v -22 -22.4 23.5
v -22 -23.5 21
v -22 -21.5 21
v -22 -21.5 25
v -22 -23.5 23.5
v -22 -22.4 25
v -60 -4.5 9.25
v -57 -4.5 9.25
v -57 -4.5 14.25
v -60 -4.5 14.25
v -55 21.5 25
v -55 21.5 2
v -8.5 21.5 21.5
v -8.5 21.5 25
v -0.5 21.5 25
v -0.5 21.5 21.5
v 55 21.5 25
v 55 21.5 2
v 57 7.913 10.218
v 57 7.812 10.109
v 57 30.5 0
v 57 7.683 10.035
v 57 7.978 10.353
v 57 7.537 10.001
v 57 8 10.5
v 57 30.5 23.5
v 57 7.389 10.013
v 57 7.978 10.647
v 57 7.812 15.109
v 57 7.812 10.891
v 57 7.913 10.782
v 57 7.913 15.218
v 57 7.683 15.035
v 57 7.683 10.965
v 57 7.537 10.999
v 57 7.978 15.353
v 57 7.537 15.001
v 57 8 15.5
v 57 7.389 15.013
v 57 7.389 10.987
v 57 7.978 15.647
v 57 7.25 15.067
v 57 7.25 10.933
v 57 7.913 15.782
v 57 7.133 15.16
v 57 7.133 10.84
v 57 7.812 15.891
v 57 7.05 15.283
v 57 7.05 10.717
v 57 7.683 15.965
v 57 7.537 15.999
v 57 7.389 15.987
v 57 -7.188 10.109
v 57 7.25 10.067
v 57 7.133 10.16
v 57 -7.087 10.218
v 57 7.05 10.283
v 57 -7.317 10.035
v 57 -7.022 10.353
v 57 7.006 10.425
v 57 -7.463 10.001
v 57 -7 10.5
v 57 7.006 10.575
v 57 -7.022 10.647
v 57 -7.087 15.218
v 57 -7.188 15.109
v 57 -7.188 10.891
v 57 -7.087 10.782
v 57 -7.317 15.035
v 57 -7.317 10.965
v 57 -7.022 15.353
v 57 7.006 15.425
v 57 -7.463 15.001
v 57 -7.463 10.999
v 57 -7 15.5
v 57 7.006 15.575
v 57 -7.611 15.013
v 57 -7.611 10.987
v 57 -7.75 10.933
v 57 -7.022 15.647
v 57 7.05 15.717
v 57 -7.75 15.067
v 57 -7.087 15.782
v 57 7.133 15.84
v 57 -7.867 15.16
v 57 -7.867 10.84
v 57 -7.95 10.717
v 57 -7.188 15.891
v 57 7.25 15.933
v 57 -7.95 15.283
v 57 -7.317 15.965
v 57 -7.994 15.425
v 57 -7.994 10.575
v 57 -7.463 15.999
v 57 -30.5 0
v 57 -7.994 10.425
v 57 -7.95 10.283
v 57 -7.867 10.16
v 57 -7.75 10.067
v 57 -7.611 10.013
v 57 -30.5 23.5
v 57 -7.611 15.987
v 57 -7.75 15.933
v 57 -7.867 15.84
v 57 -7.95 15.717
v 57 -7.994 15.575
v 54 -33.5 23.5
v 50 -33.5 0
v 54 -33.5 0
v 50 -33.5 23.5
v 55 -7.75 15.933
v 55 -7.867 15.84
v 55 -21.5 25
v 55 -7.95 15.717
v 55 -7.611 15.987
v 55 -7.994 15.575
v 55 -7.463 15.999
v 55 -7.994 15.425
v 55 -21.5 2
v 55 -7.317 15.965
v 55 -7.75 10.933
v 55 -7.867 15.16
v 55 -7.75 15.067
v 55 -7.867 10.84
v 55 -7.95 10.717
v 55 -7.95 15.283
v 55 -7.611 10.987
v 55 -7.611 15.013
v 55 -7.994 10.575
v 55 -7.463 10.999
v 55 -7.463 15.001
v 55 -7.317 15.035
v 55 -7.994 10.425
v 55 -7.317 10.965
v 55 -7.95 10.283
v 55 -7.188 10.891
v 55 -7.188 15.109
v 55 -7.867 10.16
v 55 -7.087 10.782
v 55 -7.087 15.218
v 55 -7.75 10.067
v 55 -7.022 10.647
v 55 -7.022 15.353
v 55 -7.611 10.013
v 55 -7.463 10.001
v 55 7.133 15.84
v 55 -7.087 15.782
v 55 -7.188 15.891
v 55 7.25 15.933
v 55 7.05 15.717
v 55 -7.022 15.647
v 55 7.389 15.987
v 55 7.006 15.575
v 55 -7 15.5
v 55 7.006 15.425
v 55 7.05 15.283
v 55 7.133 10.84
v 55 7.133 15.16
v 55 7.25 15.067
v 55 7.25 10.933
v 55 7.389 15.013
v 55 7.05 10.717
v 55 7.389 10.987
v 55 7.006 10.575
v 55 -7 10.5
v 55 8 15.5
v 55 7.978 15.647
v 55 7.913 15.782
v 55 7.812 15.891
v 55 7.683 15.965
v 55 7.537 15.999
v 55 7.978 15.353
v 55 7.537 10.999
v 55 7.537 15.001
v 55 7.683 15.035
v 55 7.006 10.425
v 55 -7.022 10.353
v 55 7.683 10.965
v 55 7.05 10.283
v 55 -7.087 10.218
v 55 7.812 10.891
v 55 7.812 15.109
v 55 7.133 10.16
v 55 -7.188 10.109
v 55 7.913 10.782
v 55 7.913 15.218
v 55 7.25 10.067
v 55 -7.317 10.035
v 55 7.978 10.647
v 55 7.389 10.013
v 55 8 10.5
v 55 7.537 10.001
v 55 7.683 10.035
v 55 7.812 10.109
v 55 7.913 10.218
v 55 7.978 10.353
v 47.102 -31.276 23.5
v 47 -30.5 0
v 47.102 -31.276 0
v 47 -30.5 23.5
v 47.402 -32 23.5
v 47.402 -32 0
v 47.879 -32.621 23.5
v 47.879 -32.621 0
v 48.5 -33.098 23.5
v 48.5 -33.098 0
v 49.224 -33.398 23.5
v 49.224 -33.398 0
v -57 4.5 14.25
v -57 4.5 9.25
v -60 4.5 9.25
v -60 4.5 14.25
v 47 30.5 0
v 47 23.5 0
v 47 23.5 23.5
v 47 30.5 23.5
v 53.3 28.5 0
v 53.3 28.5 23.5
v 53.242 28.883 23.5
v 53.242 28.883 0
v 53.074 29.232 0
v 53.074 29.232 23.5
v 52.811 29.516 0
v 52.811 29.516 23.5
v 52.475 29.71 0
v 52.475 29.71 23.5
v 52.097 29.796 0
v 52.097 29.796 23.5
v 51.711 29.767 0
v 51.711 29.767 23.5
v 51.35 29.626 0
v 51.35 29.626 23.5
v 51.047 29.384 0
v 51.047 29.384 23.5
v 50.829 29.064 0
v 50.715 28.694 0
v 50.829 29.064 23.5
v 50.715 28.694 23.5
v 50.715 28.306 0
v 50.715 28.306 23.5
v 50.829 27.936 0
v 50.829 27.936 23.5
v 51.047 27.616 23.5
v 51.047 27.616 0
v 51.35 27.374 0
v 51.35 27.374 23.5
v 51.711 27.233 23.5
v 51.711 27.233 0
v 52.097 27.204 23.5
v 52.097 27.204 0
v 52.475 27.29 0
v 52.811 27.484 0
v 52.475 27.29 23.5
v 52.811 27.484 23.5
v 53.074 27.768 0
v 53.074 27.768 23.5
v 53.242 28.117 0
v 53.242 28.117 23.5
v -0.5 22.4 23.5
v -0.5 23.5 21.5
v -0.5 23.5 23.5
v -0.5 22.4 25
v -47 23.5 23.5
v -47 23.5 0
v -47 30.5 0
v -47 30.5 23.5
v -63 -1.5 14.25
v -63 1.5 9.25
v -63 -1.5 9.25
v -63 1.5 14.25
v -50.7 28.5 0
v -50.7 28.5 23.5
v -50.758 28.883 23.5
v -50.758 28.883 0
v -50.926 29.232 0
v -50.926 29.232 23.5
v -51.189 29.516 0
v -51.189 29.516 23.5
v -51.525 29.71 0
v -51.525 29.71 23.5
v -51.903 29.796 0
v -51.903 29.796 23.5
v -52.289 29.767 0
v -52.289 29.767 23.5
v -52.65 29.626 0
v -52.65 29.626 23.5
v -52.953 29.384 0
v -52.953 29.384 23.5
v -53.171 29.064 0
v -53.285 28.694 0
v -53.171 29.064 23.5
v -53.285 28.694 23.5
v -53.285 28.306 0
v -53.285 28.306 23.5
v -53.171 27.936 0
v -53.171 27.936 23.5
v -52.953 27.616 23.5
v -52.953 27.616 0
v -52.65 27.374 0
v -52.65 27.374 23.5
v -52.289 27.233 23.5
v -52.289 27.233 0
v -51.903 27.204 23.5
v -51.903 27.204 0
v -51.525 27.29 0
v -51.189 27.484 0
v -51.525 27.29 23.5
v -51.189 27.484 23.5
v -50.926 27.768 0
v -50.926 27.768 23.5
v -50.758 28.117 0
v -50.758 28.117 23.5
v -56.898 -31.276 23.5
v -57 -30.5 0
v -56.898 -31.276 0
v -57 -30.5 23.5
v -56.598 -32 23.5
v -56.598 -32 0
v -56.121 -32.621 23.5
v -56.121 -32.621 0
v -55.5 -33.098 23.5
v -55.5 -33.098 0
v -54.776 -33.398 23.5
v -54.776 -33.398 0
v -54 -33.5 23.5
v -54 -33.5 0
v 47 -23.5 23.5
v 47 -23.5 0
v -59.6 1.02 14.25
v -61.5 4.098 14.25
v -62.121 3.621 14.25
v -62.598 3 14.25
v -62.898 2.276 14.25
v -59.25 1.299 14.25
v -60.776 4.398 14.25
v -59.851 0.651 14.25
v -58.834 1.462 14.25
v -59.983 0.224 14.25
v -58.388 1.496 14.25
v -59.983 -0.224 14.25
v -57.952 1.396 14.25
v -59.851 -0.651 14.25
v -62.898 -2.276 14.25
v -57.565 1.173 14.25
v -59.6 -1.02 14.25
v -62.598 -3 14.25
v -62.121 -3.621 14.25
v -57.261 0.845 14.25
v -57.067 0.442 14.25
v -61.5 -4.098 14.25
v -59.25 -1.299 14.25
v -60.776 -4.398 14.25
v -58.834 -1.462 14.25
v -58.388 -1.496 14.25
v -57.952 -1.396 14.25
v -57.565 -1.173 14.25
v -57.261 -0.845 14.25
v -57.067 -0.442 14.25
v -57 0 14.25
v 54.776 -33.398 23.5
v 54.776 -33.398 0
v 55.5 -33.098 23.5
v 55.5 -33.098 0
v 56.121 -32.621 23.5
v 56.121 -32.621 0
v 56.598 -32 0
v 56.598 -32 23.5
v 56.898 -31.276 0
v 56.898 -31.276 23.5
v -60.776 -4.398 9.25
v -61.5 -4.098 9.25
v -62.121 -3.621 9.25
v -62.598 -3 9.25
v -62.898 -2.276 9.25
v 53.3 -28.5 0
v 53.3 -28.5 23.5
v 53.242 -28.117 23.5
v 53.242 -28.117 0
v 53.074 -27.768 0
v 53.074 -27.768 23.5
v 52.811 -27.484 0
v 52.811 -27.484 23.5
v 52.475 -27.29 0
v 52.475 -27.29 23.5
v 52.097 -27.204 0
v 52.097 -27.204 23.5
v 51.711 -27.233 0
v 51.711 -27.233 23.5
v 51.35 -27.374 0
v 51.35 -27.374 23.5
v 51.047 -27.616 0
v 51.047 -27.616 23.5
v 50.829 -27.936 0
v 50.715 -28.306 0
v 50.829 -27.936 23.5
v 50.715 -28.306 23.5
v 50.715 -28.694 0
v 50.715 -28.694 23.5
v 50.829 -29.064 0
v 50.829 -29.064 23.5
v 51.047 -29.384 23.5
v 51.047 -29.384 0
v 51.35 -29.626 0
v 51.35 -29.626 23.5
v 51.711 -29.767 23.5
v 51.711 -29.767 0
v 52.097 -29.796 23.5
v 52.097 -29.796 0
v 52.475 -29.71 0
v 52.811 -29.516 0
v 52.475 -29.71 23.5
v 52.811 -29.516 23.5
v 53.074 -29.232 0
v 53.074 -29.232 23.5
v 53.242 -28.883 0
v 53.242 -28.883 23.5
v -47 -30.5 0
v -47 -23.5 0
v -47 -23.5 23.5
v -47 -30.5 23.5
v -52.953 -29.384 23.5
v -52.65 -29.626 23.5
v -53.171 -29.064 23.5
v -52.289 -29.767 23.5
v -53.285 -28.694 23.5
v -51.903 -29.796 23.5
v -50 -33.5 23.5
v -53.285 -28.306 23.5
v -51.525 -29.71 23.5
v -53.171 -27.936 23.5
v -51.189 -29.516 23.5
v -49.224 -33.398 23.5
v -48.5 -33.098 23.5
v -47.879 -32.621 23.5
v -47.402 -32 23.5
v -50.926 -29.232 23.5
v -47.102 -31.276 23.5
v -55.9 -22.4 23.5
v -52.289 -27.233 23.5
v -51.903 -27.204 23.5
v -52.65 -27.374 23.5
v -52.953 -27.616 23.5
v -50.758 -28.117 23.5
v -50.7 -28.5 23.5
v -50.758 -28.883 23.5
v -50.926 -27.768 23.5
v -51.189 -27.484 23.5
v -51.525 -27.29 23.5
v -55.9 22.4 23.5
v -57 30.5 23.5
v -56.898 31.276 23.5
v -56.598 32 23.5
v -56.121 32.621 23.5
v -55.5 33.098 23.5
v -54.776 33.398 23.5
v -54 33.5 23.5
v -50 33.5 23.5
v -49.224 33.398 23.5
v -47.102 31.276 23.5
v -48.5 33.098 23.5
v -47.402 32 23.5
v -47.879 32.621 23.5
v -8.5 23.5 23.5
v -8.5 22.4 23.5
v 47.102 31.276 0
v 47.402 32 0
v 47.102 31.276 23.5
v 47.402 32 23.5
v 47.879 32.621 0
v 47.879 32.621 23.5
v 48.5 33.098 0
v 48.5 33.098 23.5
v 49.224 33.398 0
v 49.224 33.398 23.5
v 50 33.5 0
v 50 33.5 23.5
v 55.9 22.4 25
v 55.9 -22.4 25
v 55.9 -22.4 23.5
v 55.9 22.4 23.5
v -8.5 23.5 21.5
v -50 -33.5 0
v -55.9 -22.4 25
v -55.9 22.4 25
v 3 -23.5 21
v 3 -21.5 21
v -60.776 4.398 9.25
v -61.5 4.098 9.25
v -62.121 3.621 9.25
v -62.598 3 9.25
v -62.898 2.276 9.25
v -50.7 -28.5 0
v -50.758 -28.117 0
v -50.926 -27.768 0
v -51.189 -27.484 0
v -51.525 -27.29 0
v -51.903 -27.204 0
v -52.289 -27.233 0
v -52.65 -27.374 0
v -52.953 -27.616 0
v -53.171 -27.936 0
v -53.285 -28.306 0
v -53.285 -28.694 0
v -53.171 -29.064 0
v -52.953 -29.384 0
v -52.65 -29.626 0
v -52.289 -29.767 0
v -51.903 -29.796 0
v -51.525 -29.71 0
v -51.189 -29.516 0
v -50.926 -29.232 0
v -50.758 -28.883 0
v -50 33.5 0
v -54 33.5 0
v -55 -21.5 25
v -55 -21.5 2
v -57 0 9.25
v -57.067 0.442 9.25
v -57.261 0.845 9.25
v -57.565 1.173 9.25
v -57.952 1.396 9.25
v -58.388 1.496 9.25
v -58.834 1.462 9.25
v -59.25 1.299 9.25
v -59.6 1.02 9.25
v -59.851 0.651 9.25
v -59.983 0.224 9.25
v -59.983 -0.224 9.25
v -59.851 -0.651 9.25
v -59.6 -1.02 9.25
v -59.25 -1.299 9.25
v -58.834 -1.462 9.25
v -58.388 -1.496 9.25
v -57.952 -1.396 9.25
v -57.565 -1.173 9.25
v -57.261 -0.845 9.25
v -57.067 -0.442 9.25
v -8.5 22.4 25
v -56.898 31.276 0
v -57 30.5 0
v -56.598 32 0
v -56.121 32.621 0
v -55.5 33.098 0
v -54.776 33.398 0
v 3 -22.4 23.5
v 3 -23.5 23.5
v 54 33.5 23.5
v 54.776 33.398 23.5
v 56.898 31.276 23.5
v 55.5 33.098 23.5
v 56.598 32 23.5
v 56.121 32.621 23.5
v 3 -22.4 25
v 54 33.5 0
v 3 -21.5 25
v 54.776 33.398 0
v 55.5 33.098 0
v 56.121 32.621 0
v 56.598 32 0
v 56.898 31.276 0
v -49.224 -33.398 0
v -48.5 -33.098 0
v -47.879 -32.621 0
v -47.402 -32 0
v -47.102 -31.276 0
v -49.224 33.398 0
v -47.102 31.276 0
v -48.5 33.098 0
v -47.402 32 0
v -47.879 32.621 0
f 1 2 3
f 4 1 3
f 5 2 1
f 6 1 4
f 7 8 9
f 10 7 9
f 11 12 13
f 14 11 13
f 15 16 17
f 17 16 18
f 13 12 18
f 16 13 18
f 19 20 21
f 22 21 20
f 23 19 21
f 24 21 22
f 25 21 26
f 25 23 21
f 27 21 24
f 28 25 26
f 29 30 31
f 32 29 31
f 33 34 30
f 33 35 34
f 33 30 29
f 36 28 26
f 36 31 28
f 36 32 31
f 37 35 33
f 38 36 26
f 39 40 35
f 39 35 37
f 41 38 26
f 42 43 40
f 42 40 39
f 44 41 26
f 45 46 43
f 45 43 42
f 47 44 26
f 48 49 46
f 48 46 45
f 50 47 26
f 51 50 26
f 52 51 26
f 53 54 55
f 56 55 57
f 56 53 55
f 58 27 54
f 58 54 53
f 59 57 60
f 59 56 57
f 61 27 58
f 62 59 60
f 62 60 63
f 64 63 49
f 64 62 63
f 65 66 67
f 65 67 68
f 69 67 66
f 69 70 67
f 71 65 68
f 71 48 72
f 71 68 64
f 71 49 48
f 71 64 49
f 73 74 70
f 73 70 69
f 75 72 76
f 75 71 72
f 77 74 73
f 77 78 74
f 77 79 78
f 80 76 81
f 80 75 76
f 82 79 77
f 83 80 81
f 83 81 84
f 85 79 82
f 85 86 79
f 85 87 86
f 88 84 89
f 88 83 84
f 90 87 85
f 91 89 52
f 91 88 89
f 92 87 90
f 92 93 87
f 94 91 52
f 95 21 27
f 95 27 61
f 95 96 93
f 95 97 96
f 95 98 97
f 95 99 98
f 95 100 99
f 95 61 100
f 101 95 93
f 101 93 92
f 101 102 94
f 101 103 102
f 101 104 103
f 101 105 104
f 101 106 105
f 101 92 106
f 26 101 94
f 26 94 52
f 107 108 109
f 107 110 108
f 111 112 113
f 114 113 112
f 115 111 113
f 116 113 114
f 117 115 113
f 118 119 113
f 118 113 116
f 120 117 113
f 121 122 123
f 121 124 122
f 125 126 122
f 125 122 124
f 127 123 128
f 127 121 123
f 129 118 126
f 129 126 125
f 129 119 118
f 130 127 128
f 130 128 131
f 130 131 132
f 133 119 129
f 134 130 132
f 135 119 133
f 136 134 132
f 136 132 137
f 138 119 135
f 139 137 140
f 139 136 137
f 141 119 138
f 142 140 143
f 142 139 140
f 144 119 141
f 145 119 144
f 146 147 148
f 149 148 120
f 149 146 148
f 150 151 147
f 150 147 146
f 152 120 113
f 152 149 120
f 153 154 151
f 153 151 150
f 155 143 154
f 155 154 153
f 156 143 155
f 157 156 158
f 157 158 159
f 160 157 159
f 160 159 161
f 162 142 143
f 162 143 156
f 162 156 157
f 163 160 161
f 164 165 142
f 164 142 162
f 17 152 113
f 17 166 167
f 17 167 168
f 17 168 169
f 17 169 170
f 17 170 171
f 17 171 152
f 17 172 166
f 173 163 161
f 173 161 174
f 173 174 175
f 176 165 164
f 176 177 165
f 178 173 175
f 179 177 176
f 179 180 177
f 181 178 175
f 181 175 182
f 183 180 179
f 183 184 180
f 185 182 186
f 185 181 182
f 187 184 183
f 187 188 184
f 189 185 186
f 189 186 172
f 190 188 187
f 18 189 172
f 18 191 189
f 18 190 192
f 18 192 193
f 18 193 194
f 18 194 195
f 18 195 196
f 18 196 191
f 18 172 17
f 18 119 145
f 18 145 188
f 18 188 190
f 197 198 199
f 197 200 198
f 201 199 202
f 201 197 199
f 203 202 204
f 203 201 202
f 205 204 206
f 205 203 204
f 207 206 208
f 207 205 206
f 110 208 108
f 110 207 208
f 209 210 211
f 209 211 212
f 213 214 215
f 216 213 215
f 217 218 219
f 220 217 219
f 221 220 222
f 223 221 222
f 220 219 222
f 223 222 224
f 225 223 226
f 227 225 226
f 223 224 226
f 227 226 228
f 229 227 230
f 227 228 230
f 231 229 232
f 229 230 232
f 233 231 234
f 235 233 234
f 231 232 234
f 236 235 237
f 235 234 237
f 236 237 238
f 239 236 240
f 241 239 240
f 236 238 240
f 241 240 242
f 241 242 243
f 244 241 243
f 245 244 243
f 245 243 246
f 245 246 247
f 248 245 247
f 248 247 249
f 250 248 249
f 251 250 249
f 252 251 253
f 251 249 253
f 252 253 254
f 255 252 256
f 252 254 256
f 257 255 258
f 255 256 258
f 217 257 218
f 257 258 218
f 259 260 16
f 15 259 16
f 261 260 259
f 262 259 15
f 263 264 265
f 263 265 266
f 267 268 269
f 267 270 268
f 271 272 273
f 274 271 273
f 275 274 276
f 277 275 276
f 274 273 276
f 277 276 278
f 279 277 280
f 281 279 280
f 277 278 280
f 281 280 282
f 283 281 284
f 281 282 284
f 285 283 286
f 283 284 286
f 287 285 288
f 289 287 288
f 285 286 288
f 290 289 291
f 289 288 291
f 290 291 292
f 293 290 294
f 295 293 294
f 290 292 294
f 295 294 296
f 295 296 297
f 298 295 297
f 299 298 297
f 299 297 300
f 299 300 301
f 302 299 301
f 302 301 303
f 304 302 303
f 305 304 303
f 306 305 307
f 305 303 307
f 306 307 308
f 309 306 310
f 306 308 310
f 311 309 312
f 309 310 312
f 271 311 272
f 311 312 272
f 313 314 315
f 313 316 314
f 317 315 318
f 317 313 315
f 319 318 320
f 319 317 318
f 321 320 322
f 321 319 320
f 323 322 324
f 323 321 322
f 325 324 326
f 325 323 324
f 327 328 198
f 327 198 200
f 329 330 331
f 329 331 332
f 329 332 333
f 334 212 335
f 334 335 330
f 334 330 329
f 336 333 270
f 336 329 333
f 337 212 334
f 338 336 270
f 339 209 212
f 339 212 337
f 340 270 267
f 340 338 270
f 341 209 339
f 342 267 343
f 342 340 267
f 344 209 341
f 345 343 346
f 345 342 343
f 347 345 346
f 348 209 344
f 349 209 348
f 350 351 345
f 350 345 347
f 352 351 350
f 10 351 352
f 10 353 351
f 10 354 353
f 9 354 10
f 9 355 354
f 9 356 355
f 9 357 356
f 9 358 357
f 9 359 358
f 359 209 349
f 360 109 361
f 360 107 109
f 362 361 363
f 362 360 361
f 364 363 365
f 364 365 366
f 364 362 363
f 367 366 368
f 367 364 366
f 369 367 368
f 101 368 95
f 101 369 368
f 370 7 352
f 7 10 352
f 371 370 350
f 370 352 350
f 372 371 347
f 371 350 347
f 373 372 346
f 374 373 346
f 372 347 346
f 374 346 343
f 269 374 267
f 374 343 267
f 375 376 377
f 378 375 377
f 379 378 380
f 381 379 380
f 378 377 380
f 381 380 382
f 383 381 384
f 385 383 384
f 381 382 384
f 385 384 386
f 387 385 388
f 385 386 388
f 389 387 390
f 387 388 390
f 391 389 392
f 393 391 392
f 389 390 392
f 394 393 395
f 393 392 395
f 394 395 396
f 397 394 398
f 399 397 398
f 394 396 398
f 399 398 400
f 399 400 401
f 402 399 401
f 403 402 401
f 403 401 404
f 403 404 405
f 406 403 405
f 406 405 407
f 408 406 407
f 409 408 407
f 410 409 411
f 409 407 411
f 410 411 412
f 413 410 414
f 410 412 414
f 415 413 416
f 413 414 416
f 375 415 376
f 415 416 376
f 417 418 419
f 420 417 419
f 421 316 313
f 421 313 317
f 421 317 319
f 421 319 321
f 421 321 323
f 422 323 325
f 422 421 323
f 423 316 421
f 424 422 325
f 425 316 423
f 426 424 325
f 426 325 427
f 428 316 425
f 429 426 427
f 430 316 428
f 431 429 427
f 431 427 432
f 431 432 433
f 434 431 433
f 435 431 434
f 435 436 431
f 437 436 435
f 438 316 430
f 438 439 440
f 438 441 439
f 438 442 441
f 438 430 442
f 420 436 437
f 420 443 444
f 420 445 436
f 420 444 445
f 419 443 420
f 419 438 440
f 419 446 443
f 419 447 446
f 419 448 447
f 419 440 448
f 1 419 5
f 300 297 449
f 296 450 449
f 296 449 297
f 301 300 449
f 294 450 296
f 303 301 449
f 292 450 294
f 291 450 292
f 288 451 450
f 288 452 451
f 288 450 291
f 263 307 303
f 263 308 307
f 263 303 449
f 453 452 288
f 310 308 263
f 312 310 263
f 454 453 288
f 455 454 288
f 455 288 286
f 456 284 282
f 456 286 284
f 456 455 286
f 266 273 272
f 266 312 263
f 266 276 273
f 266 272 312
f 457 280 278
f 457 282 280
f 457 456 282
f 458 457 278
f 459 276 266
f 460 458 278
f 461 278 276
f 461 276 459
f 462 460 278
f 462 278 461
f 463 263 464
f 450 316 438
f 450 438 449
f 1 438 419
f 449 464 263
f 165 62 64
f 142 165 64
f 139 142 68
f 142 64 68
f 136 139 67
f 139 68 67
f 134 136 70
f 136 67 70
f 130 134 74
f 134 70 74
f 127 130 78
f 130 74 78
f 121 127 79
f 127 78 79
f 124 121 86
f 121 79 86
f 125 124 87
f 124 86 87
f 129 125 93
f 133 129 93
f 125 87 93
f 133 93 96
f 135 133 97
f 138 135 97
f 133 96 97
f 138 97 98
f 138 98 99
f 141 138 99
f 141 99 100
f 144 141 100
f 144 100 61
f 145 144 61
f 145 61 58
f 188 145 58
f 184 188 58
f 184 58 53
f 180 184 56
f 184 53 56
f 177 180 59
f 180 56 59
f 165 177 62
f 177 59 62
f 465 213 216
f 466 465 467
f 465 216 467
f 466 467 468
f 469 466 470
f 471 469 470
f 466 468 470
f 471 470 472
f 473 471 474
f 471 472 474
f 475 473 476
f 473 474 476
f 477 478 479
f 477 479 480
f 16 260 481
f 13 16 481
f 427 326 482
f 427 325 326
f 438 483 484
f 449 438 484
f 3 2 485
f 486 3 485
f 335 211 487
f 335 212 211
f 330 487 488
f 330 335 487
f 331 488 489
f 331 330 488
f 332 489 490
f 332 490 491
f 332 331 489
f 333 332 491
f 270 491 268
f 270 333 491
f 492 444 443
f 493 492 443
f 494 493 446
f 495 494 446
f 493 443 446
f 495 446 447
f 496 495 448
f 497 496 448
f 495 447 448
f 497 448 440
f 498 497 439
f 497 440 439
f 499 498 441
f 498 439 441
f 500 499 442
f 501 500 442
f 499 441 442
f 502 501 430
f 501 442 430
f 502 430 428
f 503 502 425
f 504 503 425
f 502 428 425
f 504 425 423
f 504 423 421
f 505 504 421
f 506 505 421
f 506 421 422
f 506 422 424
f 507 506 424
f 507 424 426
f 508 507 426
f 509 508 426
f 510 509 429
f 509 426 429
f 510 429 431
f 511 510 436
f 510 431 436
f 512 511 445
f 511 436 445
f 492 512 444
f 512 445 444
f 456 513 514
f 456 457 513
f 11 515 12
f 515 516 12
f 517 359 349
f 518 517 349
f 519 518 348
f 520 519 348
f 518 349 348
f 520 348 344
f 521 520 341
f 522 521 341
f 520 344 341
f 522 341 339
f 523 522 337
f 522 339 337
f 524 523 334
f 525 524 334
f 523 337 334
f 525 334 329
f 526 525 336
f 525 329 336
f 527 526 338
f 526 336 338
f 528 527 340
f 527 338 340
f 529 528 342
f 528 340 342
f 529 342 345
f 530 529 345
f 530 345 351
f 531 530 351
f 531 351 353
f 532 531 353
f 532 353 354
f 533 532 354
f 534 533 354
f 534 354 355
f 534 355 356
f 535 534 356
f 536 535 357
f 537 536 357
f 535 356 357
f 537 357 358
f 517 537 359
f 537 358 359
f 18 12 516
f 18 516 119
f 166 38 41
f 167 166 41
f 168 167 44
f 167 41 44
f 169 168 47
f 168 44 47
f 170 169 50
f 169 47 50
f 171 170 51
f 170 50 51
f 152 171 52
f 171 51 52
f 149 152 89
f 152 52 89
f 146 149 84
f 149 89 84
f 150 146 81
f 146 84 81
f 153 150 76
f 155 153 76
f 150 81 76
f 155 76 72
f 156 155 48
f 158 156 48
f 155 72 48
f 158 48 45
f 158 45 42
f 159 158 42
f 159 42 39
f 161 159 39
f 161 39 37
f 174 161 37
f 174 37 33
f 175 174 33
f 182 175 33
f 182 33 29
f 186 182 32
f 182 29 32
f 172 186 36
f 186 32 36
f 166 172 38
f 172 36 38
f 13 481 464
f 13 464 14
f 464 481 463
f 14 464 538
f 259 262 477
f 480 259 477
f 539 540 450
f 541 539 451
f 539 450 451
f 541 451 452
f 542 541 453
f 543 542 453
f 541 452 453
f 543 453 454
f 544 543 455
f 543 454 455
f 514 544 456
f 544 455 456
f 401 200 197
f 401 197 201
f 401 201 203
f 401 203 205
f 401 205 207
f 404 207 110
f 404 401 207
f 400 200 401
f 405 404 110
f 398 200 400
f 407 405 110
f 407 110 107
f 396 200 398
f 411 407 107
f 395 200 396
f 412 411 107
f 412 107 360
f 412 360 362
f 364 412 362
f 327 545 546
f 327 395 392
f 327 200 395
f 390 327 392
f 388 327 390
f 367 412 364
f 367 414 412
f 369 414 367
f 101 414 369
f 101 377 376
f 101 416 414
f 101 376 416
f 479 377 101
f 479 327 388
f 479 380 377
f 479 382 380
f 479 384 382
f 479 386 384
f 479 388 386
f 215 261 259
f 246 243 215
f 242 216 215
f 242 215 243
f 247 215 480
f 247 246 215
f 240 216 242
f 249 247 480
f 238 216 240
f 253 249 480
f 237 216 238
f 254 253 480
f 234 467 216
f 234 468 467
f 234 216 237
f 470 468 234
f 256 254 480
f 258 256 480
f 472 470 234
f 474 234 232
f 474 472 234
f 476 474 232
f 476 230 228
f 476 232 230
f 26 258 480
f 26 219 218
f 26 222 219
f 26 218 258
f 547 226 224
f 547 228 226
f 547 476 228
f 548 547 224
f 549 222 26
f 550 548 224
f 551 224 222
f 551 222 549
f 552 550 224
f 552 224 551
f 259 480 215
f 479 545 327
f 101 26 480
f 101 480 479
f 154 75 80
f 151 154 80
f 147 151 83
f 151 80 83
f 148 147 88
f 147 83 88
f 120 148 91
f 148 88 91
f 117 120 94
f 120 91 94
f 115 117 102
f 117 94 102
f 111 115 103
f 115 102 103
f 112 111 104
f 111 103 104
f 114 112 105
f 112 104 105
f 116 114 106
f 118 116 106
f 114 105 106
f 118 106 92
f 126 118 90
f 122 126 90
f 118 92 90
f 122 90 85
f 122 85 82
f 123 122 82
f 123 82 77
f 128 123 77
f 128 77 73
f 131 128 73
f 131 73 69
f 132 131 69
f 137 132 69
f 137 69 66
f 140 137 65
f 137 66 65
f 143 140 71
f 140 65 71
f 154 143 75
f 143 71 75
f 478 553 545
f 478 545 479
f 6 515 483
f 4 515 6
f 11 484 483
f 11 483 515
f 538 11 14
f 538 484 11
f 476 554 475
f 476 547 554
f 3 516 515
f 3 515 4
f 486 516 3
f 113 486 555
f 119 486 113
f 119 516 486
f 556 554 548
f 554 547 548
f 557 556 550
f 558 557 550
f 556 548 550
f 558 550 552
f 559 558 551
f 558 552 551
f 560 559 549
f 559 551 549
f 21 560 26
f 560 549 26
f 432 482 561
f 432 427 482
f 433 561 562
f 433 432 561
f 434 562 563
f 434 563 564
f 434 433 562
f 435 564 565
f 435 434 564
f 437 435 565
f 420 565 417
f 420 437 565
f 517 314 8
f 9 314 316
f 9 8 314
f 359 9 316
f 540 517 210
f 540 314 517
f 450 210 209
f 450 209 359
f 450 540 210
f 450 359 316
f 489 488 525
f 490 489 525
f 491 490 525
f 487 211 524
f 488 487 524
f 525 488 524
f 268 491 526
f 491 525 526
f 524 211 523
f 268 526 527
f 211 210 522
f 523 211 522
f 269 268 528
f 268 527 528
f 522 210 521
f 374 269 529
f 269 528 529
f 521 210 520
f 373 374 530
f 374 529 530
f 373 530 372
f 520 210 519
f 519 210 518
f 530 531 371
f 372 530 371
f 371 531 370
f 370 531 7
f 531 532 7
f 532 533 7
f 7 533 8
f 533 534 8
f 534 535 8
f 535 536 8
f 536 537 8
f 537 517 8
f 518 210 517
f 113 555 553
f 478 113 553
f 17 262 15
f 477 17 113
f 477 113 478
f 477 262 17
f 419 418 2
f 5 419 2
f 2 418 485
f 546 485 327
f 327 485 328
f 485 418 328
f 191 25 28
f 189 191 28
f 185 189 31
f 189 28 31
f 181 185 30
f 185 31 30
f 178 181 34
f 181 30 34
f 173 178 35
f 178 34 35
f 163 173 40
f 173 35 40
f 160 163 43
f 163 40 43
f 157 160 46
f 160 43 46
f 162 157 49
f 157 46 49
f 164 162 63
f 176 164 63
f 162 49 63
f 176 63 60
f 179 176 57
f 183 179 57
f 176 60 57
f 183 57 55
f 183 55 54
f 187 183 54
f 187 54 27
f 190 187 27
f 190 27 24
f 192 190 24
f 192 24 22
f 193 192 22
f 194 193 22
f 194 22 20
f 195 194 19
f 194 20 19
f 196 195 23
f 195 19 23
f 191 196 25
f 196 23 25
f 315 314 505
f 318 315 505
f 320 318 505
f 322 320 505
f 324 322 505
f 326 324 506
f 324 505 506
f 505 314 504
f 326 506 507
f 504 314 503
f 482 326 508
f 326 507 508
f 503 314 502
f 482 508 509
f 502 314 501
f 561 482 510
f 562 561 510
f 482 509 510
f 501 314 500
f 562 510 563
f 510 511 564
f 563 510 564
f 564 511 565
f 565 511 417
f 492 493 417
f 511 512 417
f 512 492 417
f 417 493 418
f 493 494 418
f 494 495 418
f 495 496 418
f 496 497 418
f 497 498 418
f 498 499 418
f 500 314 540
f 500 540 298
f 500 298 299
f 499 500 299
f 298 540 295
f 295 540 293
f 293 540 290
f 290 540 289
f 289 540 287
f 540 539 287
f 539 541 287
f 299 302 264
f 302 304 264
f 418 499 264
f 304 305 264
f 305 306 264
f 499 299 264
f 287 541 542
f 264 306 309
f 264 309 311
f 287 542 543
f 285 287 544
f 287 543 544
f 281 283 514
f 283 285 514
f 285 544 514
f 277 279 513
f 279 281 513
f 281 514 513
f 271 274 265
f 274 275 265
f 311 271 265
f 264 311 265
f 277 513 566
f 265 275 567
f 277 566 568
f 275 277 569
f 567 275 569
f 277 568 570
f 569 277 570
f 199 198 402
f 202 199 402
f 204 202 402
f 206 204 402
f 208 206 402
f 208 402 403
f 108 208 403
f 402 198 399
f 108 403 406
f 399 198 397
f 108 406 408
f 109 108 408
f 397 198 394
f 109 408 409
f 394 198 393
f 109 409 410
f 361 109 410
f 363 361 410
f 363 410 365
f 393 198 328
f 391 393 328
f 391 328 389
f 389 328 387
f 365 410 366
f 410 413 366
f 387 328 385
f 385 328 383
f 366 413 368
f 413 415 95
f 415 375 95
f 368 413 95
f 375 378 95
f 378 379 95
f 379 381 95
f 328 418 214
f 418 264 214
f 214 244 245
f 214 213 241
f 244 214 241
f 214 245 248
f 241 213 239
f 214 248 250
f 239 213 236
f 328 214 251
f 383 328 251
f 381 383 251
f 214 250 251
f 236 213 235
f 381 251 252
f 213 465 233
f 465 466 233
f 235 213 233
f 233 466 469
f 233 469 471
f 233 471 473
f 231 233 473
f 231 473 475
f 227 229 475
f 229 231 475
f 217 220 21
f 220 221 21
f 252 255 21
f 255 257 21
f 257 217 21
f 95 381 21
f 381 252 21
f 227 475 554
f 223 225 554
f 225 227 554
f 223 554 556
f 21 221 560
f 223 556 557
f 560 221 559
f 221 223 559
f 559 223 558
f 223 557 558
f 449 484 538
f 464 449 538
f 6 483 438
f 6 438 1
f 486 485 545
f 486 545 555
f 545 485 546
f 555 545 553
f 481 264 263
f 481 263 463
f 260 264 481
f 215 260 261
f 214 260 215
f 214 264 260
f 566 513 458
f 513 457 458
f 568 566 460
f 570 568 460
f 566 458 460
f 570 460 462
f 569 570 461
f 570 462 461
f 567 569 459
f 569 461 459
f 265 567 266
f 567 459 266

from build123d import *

# Parameters (mm, degrees)
SKETCH_W        = 114
SKETCH_H        = 47
PAD_DEPTH       = 25
THICKNESS_T     = -2
SKETCH001_W     = 114
SKETCH001_H     = 1.1
POCKET_DEPTH    = 1.5
SKETCH002_W     = 1.1
SKETCH002_H     = 47
POCKET001_DEPTH = 1.5
SKETCH003_W     = 10
SKETCH003_H     = 23.5
PAD001_DEPTH    = 10
SKETCH004_W     = 10
SKETCH004_H     = 23.5
PAD002_DEPTH    = 10
SKETCH005_R     = 1.3
POCKET002_DEPTH = 23.5
SKETCH006_R     = 0.5
POCKET003_DEPTH = 2
SKETCH007_W     = 9
SKETCH007_H     = 5
PAD003_DEPTH    = 6
SKETCH009_R     = 1.5
POCKET004_DEPTH = 5
FILLET_R        = 3
FILLET001_R     = 3
FILLET002_R     = 3
SKETCH010_W     = 25
SKETCH010_H     = 4
POCKET005_DEPTH = 2
SKETCH011_W     = 8
SKETCH011_H     = 3.5
POCKET006_DEPTH = 2


with BuildPart() as part:
    # Sketch → Pad (new body)
    with BuildSketch(Plane.XY):
        Rectangle(SKETCH_W, SKETCH_H)
    extrude(amount=PAD_DEPTH)

    # Thickness
    thickness_openings = [part.faces().sort_by_distance(p)[0] for p in [
        (0, 0, 25),
    ]]
    offset(amount=THICKNESS_T, openings=thickness_openings)

    # Sketch001 (on Face6 of Thickness) → Pocket (cut)
    with BuildSketch(Plane.XY.offset(25)):
        with Locations((0, -22.95)):
            Rectangle(SKETCH001_W, SKETCH001_H)
        with Locations((0, 22.95)):
            Rectangle(SKETCH001_W, SKETCH001_H)
    extrude(amount=-POCKET_DEPTH, mode=Mode.SUBTRACT)

    # Sketch002 (on Face6 of Pocket) → Pocket001 (cut)
    with BuildSketch(Plane.XY.offset(25)):
        with Locations((56.45, 0)):
            Rectangle(SKETCH002_W, SKETCH002_H)
        with Locations((-56.45, 0)):
            Rectangle(SKETCH002_W, SKETCH002_H)
    extrude(amount=-POCKET001_DEPTH, mode=Mode.SUBTRACT)

    # Sketch003 (on Face4 of Pocket001) → Pad001 (join)
    with BuildSketch(Plane(origin=(0, 23.5, 0), x_dir=(-1, 0, 0), z_dir=(0, 1, 0))):
        with Locations((-52, 11.75)):
            Rectangle(SKETCH003_W, SKETCH003_H)
        with Locations((52, 11.75)):
            Rectangle(SKETCH003_W, SKETCH003_H)
    extrude(amount=PAD001_DEPTH)

    # Sketch004 (on Face1 of Pad001) → Pad002 (join)
    with BuildSketch(Plane.XZ.offset(23.5)):
        with Locations((-52, 11.75)):
            Rectangle(SKETCH004_W, SKETCH004_H)
        with Locations((52, 11.75)):
            Rectangle(SKETCH004_W, SKETCH004_H)
    extrude(amount=PAD002_DEPTH)

    # Sketch005 (on Face12 of Pad002) → Pocket002 (cut)
    with BuildSketch(Plane.XY.offset(23.5)):
        with Locations((-52, 28.5)):
            Circle(SKETCH005_R)
        with Locations((52, 28.5)):
            Circle(SKETCH005_R)
        with Locations((52, -28.5)):
            Circle(SKETCH005_R)
        with Locations((-52, -28.5)):
            Circle(SKETCH005_R)
    extrude(amount=-POCKET002_DEPTH, mode=Mode.SUBTRACT)

    # Sketch006 (on Face12 of Pocket002) → Pocket003 (cut)
    with BuildSketch(Plane.YZ.offset(57)):
        with Locations((7.5, 10.5)):
            Circle(SKETCH006_R)
        with Locations((7.5, 15.5)):
            Circle(SKETCH006_R)
        with Locations((-7.5, 10.5)):
            Circle(SKETCH006_R)
        with Locations((-7.5, 15.5)):
            Circle(SKETCH006_R)
    extrude(amount=-POCKET003_DEPTH, mode=Mode.SUBTRACT)

    # Sketch007 (on Face4 of Pocket003) → Pad003 (join)
    with BuildSketch(Plane(origin=(-57, 0, 0), x_dir=(0, -1, 0), z_dir=(-1, 0, 0))):
        with Locations((0, 11.75)):
            Rectangle(SKETCH007_W, SKETCH007_H)
    extrude(amount=PAD003_DEPTH)

    # Sketch009 (on Face22 of Pad003) → Pocket004 (cut)
    with BuildSketch(Plane.XY.offset(14.25)):
        with Locations((-58.5, 0)):
            Circle(SKETCH009_R)
    extrude(amount=-POCKET004_DEPTH, mode=Mode.SUBTRACT)

    # Fillet
    fillet_edges = [part.edges().sort_by_distance(p)[0] for p in [
        (-57, -33.5, 11.75),
        (-47, -33.5, 11.75),
        (47, -33.5, 11.75),
        (57, -33.5, 11.75),
    ]]
    fillet(fillet_edges, radius=FILLET_R)

    # Fillet001
    fillet001_edges = [part.edges().sort_by_distance(p)[0] for p in [
        (-63, -4.5, 11.75),
        (-63, 4.5, 11.75),
    ]]
    fillet(fillet001_edges, radius=FILLET001_R)

    # Fillet002
    fillet002_edges = [part.edges().sort_by_distance(p)[0] for p in [
        (57, 33.5, 11.75),
        (47, 33.5, 11.75),
        (-47, 33.5, 11.75),
        (-57, 33.5, 11.75),
    ]]
    fillet(fillet002_edges, radius=FILLET002_R)

    # Sketch010 (on Face17 of Fillet002) → Pocket005 (cut)
    with BuildSketch(Plane.XZ.offset(23.5)):
        with Locations((-9.5, 23)):
            Rectangle(SKETCH010_W, SKETCH010_H)
    extrude(amount=-POCKET005_DEPTH, mode=Mode.SUBTRACT)

    # Sketch011 (on Face13 of Pocket005) → Pocket006 (cut)
    with BuildSketch(Plane(origin=(0, 23.5, 0), x_dir=(-1, 0, 0), z_dir=(0, 1, 0))):
        with Locations((4.5, 23.25)):
            Rectangle(SKETCH011_W, SKETCH011_H)
    extrude(amount=-POCKET006_DEPTH, mode=Mode.SUBTRACT)


solid = part.part
